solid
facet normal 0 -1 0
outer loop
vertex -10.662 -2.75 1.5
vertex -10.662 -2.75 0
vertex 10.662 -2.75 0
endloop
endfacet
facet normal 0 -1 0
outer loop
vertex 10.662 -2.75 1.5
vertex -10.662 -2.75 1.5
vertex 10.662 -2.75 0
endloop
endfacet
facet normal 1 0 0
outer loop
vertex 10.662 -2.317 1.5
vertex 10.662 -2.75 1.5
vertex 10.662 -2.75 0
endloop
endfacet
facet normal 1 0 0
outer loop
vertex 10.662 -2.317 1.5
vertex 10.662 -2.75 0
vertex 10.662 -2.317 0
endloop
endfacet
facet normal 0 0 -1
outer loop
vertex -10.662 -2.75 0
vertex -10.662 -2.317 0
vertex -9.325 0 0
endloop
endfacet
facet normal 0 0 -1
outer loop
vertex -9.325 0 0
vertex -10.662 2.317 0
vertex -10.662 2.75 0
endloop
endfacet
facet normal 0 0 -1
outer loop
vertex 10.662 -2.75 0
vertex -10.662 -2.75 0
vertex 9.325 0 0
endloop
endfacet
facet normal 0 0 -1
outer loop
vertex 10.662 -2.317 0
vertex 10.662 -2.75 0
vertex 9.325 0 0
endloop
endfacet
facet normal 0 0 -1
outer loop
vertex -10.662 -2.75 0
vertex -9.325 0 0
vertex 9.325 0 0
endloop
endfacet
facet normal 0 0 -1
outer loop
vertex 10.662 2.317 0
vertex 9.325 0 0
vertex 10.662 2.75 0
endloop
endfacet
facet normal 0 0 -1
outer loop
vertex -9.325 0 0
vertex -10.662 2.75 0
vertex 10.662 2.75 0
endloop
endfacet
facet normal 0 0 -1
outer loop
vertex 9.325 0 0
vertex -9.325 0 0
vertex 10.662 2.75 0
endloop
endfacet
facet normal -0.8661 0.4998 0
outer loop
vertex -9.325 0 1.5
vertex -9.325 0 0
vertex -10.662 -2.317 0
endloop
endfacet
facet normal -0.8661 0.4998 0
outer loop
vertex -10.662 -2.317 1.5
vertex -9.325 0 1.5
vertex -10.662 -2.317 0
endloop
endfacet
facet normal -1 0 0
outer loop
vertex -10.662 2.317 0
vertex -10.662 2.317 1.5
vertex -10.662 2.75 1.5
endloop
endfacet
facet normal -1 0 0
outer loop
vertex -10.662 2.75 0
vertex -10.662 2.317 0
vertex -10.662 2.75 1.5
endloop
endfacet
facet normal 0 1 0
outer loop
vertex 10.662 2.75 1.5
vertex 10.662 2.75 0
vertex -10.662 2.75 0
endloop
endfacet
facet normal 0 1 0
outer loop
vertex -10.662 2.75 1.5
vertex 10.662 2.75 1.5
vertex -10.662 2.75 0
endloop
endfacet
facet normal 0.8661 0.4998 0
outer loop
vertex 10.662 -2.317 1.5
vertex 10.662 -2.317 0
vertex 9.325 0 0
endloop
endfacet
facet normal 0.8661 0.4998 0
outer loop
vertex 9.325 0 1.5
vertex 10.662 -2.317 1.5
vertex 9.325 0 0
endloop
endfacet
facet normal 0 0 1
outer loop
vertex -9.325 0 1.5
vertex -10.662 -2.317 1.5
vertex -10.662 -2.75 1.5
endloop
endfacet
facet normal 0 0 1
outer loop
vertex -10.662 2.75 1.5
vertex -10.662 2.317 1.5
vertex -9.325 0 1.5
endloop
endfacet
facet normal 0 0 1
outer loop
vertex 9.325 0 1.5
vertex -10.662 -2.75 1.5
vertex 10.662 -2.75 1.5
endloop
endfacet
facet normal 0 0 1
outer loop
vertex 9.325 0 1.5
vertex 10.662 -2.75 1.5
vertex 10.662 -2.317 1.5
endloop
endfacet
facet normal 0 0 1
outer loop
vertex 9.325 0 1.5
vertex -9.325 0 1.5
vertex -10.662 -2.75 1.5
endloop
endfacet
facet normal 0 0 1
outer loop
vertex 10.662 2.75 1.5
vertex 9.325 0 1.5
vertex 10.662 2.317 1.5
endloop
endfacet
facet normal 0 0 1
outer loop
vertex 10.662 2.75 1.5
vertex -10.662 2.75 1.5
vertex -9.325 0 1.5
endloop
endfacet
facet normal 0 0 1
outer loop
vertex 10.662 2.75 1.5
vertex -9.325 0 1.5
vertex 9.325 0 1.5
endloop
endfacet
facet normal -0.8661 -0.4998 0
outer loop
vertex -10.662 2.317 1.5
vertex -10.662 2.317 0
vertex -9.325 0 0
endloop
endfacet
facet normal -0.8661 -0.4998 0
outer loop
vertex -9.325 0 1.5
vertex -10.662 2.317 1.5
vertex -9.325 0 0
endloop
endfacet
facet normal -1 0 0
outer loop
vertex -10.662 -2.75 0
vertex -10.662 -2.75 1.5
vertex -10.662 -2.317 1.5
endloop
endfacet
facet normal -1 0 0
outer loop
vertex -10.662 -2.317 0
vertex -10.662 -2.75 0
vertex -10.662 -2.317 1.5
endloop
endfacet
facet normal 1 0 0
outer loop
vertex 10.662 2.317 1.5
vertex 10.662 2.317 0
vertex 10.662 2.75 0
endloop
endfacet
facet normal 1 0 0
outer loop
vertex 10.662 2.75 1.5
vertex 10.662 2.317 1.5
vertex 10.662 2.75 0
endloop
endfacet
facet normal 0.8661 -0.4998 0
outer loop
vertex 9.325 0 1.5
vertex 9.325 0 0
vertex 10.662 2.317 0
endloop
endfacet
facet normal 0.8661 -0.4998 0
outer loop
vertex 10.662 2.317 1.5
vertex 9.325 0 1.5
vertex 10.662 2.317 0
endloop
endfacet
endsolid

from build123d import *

# Parameters (mm, degrees)
BOSS_EXTRUDE1_DEPTH = 1.5
SKETCH3_W           = 0.25
SKETCH3_H           = 5.5
CUT_EXTRUDE1_DEPTH  = 12.352995302


with BuildPart() as part:
    # Sketch2 → Boss-Extrude1 (new body)
    with BuildSketch(Plane.XY):
        Polygon((-10.91228676, 2.75), (-9.324573519, 0), (-10.91228676, -2.75), (10.91228676, -2.75), (9.324573519, 0), (10.91228676, 2.75), align=None)
    extrude(amount=BOSS_EXTRUDE1_DEPTH)

    # Sketch3 → Cut-Extrude1 (cut, through all)
    with BuildSketch(Plane.XY.offset(1.5)):
        with Locations((10.78728676, 0)):
            Rectangle(SKETCH3_W, SKETCH3_H)
        with Locations((-10.78728676, 0)):
            Rectangle(SKETCH3_W, SKETCH3_H)
    extrude(amount=-CUT_EXTRUDE1_DEPTH, mode=Mode.SUBTRACT)


solid = part.part
